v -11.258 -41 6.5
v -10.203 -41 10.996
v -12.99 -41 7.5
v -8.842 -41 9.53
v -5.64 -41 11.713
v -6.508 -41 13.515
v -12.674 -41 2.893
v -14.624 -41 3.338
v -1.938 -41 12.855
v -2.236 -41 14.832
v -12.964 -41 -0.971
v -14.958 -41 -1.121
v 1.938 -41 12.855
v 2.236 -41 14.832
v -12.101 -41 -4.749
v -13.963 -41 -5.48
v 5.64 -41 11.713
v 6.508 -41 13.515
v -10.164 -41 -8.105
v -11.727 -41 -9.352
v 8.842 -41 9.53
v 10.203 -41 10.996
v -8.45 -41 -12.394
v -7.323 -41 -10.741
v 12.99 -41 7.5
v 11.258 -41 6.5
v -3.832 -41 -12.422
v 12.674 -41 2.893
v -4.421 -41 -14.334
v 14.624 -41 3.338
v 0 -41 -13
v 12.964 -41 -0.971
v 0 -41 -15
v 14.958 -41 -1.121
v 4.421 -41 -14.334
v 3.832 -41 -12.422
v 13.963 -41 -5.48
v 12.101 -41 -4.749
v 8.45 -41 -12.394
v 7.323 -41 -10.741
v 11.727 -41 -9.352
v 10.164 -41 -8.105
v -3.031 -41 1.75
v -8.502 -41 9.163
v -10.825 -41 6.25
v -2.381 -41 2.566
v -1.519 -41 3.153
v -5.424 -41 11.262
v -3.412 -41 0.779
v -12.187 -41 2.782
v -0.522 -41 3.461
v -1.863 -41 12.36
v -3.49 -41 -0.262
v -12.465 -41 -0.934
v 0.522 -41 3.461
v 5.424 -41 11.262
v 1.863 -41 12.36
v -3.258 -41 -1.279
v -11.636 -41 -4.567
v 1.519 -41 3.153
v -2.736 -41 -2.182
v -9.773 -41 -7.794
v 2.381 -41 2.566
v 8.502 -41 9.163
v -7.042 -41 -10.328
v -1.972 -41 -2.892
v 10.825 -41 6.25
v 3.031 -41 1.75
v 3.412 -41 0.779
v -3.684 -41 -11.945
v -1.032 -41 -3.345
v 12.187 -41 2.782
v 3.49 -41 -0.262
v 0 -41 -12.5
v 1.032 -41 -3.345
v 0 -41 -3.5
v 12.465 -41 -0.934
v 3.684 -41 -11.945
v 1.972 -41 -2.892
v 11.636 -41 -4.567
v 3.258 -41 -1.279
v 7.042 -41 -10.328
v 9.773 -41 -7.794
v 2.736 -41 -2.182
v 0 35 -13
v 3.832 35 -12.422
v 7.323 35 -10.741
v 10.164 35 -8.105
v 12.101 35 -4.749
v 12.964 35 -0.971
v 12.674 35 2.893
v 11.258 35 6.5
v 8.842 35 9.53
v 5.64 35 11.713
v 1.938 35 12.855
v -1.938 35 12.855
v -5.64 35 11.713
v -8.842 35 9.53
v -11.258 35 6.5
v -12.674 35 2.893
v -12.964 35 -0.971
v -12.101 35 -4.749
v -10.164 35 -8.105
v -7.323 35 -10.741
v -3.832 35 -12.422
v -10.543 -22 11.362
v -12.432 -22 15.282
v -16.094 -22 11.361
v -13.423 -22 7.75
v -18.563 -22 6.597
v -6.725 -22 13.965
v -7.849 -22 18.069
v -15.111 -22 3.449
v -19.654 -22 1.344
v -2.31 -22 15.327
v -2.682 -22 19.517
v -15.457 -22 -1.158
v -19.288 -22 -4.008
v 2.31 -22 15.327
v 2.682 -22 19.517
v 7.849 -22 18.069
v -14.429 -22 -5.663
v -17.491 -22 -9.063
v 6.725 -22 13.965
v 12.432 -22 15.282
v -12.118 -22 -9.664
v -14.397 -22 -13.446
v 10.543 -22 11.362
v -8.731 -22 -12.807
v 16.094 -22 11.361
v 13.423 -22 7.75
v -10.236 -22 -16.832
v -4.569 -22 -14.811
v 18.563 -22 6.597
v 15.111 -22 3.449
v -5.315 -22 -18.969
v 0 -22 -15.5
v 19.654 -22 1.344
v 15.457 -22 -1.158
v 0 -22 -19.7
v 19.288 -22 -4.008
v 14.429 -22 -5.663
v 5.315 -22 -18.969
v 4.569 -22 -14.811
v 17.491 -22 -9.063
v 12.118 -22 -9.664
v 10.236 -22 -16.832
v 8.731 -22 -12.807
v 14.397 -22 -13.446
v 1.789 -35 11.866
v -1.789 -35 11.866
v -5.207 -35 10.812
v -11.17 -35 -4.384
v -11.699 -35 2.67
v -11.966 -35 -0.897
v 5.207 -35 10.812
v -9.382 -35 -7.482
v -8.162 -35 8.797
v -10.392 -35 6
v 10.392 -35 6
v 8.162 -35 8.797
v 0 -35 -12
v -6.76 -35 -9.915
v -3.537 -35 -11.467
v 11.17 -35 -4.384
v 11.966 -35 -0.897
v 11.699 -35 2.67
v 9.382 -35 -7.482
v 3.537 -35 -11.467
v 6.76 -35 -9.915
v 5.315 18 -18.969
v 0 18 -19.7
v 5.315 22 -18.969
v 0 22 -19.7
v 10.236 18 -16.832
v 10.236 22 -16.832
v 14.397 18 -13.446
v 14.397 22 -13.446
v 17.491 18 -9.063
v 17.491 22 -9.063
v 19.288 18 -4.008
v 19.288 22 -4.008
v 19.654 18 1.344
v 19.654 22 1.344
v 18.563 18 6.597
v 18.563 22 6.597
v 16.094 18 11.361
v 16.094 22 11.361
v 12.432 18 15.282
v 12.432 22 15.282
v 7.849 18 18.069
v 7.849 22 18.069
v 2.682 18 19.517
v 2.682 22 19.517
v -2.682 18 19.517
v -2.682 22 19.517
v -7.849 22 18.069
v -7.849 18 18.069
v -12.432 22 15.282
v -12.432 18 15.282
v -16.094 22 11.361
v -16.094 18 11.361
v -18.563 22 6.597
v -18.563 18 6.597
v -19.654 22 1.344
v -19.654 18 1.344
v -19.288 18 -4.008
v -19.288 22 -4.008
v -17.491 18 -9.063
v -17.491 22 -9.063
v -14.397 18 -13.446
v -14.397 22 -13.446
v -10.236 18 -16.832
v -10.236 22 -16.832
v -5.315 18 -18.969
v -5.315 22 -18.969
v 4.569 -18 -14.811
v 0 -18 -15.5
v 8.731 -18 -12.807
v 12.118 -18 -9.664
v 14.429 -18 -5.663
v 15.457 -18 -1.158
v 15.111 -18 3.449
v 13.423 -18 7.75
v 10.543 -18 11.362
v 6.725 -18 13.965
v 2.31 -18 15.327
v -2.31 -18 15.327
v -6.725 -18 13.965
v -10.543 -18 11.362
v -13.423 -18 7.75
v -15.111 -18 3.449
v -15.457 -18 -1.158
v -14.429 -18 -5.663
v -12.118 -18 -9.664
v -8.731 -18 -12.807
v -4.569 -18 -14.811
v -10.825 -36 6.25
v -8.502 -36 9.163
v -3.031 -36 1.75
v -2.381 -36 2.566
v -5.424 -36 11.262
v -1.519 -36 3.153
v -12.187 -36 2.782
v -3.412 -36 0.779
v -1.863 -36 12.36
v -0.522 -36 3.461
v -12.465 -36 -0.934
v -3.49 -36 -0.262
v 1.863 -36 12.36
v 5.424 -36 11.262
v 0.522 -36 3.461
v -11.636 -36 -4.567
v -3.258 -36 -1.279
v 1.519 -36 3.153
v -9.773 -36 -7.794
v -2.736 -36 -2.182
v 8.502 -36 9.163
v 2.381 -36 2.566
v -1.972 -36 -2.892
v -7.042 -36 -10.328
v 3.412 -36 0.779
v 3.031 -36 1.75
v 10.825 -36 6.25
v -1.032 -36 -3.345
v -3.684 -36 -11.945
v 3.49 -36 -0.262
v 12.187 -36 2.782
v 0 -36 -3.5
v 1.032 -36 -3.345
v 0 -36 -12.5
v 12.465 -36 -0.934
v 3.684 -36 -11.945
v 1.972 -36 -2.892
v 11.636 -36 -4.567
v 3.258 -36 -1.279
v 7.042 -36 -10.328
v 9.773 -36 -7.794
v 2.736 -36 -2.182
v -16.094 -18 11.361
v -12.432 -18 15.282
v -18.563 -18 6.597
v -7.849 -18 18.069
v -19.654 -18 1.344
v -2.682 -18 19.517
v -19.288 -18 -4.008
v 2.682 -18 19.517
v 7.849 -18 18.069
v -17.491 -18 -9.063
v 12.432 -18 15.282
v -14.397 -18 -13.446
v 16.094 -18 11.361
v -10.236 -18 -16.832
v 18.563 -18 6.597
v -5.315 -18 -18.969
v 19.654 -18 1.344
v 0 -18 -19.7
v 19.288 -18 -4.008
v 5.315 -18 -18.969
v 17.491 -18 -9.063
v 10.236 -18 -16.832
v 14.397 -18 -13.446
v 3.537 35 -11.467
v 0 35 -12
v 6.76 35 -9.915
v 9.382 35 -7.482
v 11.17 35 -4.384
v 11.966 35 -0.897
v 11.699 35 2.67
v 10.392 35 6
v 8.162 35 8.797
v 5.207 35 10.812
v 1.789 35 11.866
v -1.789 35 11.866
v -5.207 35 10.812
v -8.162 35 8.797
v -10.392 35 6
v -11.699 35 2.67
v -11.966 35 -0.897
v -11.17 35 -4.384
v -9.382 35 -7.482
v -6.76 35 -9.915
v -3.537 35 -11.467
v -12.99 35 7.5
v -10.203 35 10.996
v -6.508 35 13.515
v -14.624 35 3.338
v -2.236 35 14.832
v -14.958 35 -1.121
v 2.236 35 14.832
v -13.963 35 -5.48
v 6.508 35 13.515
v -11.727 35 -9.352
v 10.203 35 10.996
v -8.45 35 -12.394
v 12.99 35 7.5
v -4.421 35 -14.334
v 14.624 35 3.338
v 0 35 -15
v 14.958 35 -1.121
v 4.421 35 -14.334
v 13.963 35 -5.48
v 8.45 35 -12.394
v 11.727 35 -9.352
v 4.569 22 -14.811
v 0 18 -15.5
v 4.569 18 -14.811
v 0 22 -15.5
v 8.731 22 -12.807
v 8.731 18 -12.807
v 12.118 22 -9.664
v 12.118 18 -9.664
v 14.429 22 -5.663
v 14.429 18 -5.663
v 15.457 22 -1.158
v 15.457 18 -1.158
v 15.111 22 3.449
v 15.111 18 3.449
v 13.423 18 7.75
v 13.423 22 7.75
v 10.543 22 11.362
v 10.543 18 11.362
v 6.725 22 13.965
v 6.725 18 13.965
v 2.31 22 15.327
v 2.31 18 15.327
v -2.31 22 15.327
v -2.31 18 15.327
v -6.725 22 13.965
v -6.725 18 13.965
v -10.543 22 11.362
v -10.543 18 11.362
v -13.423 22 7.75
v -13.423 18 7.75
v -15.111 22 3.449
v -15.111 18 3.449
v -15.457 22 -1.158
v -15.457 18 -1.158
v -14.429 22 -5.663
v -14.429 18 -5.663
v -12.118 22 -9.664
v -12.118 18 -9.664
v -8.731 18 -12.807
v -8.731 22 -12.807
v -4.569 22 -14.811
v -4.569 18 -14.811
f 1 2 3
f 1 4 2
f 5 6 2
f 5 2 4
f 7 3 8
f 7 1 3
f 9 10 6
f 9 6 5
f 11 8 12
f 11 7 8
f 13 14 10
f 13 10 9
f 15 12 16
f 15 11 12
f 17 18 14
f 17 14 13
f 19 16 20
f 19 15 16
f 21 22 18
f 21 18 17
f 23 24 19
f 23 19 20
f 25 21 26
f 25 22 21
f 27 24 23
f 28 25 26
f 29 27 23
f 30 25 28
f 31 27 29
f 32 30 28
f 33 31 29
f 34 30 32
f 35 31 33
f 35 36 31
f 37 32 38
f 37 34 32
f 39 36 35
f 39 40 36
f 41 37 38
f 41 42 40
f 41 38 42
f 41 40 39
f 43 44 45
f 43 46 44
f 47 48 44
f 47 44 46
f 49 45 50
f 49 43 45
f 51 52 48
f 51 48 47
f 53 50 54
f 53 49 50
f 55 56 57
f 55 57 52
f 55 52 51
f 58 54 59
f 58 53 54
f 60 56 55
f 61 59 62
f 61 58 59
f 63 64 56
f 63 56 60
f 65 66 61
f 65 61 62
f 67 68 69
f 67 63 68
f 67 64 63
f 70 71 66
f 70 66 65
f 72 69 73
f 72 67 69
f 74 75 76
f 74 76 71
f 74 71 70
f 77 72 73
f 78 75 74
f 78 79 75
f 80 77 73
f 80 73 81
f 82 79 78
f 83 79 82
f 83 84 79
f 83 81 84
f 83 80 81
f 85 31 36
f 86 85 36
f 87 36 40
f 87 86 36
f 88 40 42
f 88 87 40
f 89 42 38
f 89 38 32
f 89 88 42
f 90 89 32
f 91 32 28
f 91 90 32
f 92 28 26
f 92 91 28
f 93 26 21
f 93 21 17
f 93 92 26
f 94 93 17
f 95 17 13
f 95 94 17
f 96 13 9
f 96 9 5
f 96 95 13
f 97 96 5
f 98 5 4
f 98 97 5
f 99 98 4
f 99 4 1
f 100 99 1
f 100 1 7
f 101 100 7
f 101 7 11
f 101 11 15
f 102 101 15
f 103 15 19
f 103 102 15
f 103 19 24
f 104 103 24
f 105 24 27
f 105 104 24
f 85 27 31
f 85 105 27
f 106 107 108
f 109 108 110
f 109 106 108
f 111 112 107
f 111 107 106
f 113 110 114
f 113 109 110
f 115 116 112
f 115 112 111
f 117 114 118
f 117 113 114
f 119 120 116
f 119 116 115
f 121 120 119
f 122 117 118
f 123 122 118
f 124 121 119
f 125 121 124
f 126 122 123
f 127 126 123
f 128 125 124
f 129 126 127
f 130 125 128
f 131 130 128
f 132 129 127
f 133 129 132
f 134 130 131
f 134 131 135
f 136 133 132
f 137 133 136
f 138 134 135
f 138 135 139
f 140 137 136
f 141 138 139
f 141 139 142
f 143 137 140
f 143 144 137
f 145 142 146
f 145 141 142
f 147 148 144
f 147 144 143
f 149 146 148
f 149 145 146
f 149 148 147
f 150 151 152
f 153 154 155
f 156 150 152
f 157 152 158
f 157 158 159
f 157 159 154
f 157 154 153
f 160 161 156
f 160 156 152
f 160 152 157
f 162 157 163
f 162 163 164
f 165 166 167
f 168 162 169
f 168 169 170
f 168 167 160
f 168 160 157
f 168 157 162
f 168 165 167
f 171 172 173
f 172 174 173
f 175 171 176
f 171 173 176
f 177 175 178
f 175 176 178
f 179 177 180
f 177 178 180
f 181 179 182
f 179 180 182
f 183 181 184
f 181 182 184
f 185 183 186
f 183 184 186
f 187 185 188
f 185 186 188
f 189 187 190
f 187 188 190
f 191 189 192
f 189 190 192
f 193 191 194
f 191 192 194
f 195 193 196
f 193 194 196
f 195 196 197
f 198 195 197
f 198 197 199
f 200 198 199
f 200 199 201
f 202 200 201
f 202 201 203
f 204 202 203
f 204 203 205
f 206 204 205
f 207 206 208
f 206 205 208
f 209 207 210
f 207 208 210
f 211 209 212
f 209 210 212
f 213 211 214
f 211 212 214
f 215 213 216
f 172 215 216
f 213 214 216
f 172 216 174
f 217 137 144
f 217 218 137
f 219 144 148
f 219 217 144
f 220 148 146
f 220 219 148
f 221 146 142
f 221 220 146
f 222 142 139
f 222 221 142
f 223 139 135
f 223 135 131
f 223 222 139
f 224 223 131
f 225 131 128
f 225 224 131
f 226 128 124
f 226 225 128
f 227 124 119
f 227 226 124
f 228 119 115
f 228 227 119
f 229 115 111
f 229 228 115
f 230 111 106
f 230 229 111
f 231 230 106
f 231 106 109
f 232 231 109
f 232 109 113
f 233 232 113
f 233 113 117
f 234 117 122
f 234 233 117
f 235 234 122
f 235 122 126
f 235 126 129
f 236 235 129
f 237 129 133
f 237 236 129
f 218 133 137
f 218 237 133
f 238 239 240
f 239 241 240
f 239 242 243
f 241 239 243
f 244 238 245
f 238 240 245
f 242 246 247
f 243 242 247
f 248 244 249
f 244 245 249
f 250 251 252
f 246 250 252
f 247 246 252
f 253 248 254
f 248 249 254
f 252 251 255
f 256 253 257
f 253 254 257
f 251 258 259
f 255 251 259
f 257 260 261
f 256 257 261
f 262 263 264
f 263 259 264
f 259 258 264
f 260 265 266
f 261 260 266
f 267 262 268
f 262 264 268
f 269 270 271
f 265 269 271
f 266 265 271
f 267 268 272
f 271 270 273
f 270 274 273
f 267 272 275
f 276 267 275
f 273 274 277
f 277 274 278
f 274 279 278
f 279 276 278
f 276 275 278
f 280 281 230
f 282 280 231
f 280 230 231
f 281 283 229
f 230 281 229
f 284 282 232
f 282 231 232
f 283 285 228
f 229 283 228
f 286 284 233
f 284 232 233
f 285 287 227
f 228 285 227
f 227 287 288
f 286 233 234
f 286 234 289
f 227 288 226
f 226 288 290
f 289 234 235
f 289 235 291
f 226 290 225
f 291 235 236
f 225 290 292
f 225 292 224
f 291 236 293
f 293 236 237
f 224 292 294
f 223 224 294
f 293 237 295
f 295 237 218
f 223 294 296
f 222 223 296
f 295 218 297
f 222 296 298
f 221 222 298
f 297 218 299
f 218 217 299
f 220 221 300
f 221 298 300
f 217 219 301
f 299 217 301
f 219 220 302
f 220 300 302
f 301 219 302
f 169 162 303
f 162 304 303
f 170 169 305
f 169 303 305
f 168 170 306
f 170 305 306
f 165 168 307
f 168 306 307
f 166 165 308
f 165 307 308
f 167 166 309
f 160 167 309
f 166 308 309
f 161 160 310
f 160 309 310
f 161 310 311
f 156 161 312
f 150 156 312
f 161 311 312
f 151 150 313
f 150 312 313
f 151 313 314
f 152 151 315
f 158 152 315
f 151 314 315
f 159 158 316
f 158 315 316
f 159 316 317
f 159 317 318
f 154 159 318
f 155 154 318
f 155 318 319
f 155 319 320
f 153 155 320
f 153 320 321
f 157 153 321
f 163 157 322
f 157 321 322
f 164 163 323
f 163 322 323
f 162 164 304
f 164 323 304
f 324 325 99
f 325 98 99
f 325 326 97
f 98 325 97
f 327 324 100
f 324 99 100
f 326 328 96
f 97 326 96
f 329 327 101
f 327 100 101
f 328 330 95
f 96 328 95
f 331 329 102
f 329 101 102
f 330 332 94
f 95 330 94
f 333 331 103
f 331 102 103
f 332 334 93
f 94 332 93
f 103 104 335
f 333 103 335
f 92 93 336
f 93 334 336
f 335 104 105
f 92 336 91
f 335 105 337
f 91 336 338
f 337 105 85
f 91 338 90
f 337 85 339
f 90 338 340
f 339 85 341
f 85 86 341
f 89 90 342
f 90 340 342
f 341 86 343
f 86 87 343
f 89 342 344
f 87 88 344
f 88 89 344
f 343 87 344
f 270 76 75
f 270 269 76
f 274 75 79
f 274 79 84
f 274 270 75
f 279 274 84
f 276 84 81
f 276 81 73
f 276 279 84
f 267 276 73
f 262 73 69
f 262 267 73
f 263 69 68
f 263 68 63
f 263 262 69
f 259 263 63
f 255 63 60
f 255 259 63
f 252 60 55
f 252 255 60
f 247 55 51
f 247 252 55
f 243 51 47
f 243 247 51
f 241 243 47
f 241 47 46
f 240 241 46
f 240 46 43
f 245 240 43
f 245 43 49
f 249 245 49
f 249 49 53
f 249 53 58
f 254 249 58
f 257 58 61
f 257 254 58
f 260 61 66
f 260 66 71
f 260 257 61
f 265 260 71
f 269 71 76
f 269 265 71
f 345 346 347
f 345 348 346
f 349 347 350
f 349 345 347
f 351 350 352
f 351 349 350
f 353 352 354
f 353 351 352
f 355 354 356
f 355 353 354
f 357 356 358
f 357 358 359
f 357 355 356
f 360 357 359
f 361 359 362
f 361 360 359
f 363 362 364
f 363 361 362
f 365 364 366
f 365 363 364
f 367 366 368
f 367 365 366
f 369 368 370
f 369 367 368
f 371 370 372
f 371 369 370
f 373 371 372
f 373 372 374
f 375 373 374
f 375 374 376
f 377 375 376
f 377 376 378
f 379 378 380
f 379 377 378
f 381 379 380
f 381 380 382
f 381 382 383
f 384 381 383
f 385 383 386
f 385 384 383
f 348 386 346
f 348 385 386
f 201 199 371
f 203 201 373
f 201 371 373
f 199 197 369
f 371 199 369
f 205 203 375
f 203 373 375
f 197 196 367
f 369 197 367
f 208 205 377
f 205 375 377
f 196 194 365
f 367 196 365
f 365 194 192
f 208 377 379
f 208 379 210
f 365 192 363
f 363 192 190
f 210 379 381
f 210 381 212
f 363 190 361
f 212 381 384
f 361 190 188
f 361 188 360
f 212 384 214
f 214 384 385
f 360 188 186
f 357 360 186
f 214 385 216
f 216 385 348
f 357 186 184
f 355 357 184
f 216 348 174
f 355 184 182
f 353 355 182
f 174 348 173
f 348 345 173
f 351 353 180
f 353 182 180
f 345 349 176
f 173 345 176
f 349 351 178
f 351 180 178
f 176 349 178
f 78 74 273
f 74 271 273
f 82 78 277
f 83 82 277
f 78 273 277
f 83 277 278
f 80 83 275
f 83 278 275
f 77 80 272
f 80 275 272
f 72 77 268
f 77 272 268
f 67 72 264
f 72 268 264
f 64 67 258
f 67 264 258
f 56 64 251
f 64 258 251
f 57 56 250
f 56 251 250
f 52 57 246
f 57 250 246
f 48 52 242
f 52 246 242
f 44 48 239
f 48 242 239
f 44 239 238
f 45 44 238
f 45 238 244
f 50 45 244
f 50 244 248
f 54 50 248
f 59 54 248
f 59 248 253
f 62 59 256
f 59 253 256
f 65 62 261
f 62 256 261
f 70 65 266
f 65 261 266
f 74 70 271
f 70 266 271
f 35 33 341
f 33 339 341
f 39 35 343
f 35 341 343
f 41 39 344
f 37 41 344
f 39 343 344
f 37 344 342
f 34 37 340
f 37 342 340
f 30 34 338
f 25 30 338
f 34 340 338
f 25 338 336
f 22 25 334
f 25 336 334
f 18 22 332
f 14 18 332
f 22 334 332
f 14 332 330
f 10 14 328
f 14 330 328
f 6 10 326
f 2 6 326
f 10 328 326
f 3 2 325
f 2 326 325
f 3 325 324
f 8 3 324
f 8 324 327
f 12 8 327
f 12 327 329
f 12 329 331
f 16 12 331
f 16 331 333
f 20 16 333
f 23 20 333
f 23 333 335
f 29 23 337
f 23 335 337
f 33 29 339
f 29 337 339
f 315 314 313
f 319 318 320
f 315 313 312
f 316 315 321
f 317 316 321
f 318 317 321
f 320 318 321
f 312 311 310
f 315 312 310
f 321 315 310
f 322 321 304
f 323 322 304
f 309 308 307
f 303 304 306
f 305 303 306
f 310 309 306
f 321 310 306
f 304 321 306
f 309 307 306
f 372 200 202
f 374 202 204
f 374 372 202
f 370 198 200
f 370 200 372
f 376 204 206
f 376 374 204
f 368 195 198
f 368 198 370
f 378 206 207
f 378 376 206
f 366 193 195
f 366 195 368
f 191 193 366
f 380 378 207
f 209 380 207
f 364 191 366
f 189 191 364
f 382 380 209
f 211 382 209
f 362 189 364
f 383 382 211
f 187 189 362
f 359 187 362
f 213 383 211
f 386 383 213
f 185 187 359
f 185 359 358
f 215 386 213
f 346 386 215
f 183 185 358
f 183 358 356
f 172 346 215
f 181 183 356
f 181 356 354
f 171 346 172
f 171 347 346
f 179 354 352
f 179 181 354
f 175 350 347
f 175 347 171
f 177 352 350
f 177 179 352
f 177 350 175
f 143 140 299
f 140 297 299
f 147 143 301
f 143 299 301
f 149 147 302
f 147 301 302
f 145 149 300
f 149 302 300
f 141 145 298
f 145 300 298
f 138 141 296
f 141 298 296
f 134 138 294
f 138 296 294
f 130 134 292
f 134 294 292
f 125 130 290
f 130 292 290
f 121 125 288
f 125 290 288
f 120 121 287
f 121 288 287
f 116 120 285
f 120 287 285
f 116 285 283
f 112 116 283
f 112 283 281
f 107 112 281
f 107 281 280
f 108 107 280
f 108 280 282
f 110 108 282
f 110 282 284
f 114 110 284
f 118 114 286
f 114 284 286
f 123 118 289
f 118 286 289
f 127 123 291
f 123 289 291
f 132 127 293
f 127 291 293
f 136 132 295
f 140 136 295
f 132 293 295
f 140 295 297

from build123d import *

# Parameters (mm, degrees)
F0_W = 70
F0_H = 12
F2_W = 76
F2_H = 2
F4_W = 4
F4_H = 4.2
F6_W = 5
F6_H = 9


with BuildPart() as f1:
    # F0 (on Right) → F1 (revolve)
    with BuildSketch(Plane.YZ):
        with Locations((0, -6)):
            Rectangle(F0_W, F0_H)
    revolve(axis=Axis((0, 0, 0), (0, -1, 0)))


with BuildPart() as f3:
    # F2 (on Right) → F3 (revolve)
    with BuildSketch(Plane.YZ):
        with Locations((-3, -14)):
            Rectangle(F2_W, F2_H)
    revolve(axis=Axis((0, 2.477687, 0), (0, -1, 0)))


with BuildPart() as f5:
    # F4 (on Right) → F5 (revolve)
    with BuildSketch(Plane.YZ):
        with Locations((-20, -17.6)):
            Rectangle(F4_W, F4_H)
        with Locations((20, -17.6)):
            Rectangle(F4_W, F4_H)
    revolve(axis=Axis((0, 2.477687, 0), (0, -1, 0)))


with BuildPart() as f7:
    # F6 (on Right) → F7 (revolve)
    with BuildSketch(Plane.YZ):
        with Locations((-38.5, -8)):
            Rectangle(F6_W, F6_H)
    revolve(axis=Axis((0, 2.477687, 0), (0, -1, 0)))


solid = Compound([f1.part, f3.part, f5.part, f7.part])
